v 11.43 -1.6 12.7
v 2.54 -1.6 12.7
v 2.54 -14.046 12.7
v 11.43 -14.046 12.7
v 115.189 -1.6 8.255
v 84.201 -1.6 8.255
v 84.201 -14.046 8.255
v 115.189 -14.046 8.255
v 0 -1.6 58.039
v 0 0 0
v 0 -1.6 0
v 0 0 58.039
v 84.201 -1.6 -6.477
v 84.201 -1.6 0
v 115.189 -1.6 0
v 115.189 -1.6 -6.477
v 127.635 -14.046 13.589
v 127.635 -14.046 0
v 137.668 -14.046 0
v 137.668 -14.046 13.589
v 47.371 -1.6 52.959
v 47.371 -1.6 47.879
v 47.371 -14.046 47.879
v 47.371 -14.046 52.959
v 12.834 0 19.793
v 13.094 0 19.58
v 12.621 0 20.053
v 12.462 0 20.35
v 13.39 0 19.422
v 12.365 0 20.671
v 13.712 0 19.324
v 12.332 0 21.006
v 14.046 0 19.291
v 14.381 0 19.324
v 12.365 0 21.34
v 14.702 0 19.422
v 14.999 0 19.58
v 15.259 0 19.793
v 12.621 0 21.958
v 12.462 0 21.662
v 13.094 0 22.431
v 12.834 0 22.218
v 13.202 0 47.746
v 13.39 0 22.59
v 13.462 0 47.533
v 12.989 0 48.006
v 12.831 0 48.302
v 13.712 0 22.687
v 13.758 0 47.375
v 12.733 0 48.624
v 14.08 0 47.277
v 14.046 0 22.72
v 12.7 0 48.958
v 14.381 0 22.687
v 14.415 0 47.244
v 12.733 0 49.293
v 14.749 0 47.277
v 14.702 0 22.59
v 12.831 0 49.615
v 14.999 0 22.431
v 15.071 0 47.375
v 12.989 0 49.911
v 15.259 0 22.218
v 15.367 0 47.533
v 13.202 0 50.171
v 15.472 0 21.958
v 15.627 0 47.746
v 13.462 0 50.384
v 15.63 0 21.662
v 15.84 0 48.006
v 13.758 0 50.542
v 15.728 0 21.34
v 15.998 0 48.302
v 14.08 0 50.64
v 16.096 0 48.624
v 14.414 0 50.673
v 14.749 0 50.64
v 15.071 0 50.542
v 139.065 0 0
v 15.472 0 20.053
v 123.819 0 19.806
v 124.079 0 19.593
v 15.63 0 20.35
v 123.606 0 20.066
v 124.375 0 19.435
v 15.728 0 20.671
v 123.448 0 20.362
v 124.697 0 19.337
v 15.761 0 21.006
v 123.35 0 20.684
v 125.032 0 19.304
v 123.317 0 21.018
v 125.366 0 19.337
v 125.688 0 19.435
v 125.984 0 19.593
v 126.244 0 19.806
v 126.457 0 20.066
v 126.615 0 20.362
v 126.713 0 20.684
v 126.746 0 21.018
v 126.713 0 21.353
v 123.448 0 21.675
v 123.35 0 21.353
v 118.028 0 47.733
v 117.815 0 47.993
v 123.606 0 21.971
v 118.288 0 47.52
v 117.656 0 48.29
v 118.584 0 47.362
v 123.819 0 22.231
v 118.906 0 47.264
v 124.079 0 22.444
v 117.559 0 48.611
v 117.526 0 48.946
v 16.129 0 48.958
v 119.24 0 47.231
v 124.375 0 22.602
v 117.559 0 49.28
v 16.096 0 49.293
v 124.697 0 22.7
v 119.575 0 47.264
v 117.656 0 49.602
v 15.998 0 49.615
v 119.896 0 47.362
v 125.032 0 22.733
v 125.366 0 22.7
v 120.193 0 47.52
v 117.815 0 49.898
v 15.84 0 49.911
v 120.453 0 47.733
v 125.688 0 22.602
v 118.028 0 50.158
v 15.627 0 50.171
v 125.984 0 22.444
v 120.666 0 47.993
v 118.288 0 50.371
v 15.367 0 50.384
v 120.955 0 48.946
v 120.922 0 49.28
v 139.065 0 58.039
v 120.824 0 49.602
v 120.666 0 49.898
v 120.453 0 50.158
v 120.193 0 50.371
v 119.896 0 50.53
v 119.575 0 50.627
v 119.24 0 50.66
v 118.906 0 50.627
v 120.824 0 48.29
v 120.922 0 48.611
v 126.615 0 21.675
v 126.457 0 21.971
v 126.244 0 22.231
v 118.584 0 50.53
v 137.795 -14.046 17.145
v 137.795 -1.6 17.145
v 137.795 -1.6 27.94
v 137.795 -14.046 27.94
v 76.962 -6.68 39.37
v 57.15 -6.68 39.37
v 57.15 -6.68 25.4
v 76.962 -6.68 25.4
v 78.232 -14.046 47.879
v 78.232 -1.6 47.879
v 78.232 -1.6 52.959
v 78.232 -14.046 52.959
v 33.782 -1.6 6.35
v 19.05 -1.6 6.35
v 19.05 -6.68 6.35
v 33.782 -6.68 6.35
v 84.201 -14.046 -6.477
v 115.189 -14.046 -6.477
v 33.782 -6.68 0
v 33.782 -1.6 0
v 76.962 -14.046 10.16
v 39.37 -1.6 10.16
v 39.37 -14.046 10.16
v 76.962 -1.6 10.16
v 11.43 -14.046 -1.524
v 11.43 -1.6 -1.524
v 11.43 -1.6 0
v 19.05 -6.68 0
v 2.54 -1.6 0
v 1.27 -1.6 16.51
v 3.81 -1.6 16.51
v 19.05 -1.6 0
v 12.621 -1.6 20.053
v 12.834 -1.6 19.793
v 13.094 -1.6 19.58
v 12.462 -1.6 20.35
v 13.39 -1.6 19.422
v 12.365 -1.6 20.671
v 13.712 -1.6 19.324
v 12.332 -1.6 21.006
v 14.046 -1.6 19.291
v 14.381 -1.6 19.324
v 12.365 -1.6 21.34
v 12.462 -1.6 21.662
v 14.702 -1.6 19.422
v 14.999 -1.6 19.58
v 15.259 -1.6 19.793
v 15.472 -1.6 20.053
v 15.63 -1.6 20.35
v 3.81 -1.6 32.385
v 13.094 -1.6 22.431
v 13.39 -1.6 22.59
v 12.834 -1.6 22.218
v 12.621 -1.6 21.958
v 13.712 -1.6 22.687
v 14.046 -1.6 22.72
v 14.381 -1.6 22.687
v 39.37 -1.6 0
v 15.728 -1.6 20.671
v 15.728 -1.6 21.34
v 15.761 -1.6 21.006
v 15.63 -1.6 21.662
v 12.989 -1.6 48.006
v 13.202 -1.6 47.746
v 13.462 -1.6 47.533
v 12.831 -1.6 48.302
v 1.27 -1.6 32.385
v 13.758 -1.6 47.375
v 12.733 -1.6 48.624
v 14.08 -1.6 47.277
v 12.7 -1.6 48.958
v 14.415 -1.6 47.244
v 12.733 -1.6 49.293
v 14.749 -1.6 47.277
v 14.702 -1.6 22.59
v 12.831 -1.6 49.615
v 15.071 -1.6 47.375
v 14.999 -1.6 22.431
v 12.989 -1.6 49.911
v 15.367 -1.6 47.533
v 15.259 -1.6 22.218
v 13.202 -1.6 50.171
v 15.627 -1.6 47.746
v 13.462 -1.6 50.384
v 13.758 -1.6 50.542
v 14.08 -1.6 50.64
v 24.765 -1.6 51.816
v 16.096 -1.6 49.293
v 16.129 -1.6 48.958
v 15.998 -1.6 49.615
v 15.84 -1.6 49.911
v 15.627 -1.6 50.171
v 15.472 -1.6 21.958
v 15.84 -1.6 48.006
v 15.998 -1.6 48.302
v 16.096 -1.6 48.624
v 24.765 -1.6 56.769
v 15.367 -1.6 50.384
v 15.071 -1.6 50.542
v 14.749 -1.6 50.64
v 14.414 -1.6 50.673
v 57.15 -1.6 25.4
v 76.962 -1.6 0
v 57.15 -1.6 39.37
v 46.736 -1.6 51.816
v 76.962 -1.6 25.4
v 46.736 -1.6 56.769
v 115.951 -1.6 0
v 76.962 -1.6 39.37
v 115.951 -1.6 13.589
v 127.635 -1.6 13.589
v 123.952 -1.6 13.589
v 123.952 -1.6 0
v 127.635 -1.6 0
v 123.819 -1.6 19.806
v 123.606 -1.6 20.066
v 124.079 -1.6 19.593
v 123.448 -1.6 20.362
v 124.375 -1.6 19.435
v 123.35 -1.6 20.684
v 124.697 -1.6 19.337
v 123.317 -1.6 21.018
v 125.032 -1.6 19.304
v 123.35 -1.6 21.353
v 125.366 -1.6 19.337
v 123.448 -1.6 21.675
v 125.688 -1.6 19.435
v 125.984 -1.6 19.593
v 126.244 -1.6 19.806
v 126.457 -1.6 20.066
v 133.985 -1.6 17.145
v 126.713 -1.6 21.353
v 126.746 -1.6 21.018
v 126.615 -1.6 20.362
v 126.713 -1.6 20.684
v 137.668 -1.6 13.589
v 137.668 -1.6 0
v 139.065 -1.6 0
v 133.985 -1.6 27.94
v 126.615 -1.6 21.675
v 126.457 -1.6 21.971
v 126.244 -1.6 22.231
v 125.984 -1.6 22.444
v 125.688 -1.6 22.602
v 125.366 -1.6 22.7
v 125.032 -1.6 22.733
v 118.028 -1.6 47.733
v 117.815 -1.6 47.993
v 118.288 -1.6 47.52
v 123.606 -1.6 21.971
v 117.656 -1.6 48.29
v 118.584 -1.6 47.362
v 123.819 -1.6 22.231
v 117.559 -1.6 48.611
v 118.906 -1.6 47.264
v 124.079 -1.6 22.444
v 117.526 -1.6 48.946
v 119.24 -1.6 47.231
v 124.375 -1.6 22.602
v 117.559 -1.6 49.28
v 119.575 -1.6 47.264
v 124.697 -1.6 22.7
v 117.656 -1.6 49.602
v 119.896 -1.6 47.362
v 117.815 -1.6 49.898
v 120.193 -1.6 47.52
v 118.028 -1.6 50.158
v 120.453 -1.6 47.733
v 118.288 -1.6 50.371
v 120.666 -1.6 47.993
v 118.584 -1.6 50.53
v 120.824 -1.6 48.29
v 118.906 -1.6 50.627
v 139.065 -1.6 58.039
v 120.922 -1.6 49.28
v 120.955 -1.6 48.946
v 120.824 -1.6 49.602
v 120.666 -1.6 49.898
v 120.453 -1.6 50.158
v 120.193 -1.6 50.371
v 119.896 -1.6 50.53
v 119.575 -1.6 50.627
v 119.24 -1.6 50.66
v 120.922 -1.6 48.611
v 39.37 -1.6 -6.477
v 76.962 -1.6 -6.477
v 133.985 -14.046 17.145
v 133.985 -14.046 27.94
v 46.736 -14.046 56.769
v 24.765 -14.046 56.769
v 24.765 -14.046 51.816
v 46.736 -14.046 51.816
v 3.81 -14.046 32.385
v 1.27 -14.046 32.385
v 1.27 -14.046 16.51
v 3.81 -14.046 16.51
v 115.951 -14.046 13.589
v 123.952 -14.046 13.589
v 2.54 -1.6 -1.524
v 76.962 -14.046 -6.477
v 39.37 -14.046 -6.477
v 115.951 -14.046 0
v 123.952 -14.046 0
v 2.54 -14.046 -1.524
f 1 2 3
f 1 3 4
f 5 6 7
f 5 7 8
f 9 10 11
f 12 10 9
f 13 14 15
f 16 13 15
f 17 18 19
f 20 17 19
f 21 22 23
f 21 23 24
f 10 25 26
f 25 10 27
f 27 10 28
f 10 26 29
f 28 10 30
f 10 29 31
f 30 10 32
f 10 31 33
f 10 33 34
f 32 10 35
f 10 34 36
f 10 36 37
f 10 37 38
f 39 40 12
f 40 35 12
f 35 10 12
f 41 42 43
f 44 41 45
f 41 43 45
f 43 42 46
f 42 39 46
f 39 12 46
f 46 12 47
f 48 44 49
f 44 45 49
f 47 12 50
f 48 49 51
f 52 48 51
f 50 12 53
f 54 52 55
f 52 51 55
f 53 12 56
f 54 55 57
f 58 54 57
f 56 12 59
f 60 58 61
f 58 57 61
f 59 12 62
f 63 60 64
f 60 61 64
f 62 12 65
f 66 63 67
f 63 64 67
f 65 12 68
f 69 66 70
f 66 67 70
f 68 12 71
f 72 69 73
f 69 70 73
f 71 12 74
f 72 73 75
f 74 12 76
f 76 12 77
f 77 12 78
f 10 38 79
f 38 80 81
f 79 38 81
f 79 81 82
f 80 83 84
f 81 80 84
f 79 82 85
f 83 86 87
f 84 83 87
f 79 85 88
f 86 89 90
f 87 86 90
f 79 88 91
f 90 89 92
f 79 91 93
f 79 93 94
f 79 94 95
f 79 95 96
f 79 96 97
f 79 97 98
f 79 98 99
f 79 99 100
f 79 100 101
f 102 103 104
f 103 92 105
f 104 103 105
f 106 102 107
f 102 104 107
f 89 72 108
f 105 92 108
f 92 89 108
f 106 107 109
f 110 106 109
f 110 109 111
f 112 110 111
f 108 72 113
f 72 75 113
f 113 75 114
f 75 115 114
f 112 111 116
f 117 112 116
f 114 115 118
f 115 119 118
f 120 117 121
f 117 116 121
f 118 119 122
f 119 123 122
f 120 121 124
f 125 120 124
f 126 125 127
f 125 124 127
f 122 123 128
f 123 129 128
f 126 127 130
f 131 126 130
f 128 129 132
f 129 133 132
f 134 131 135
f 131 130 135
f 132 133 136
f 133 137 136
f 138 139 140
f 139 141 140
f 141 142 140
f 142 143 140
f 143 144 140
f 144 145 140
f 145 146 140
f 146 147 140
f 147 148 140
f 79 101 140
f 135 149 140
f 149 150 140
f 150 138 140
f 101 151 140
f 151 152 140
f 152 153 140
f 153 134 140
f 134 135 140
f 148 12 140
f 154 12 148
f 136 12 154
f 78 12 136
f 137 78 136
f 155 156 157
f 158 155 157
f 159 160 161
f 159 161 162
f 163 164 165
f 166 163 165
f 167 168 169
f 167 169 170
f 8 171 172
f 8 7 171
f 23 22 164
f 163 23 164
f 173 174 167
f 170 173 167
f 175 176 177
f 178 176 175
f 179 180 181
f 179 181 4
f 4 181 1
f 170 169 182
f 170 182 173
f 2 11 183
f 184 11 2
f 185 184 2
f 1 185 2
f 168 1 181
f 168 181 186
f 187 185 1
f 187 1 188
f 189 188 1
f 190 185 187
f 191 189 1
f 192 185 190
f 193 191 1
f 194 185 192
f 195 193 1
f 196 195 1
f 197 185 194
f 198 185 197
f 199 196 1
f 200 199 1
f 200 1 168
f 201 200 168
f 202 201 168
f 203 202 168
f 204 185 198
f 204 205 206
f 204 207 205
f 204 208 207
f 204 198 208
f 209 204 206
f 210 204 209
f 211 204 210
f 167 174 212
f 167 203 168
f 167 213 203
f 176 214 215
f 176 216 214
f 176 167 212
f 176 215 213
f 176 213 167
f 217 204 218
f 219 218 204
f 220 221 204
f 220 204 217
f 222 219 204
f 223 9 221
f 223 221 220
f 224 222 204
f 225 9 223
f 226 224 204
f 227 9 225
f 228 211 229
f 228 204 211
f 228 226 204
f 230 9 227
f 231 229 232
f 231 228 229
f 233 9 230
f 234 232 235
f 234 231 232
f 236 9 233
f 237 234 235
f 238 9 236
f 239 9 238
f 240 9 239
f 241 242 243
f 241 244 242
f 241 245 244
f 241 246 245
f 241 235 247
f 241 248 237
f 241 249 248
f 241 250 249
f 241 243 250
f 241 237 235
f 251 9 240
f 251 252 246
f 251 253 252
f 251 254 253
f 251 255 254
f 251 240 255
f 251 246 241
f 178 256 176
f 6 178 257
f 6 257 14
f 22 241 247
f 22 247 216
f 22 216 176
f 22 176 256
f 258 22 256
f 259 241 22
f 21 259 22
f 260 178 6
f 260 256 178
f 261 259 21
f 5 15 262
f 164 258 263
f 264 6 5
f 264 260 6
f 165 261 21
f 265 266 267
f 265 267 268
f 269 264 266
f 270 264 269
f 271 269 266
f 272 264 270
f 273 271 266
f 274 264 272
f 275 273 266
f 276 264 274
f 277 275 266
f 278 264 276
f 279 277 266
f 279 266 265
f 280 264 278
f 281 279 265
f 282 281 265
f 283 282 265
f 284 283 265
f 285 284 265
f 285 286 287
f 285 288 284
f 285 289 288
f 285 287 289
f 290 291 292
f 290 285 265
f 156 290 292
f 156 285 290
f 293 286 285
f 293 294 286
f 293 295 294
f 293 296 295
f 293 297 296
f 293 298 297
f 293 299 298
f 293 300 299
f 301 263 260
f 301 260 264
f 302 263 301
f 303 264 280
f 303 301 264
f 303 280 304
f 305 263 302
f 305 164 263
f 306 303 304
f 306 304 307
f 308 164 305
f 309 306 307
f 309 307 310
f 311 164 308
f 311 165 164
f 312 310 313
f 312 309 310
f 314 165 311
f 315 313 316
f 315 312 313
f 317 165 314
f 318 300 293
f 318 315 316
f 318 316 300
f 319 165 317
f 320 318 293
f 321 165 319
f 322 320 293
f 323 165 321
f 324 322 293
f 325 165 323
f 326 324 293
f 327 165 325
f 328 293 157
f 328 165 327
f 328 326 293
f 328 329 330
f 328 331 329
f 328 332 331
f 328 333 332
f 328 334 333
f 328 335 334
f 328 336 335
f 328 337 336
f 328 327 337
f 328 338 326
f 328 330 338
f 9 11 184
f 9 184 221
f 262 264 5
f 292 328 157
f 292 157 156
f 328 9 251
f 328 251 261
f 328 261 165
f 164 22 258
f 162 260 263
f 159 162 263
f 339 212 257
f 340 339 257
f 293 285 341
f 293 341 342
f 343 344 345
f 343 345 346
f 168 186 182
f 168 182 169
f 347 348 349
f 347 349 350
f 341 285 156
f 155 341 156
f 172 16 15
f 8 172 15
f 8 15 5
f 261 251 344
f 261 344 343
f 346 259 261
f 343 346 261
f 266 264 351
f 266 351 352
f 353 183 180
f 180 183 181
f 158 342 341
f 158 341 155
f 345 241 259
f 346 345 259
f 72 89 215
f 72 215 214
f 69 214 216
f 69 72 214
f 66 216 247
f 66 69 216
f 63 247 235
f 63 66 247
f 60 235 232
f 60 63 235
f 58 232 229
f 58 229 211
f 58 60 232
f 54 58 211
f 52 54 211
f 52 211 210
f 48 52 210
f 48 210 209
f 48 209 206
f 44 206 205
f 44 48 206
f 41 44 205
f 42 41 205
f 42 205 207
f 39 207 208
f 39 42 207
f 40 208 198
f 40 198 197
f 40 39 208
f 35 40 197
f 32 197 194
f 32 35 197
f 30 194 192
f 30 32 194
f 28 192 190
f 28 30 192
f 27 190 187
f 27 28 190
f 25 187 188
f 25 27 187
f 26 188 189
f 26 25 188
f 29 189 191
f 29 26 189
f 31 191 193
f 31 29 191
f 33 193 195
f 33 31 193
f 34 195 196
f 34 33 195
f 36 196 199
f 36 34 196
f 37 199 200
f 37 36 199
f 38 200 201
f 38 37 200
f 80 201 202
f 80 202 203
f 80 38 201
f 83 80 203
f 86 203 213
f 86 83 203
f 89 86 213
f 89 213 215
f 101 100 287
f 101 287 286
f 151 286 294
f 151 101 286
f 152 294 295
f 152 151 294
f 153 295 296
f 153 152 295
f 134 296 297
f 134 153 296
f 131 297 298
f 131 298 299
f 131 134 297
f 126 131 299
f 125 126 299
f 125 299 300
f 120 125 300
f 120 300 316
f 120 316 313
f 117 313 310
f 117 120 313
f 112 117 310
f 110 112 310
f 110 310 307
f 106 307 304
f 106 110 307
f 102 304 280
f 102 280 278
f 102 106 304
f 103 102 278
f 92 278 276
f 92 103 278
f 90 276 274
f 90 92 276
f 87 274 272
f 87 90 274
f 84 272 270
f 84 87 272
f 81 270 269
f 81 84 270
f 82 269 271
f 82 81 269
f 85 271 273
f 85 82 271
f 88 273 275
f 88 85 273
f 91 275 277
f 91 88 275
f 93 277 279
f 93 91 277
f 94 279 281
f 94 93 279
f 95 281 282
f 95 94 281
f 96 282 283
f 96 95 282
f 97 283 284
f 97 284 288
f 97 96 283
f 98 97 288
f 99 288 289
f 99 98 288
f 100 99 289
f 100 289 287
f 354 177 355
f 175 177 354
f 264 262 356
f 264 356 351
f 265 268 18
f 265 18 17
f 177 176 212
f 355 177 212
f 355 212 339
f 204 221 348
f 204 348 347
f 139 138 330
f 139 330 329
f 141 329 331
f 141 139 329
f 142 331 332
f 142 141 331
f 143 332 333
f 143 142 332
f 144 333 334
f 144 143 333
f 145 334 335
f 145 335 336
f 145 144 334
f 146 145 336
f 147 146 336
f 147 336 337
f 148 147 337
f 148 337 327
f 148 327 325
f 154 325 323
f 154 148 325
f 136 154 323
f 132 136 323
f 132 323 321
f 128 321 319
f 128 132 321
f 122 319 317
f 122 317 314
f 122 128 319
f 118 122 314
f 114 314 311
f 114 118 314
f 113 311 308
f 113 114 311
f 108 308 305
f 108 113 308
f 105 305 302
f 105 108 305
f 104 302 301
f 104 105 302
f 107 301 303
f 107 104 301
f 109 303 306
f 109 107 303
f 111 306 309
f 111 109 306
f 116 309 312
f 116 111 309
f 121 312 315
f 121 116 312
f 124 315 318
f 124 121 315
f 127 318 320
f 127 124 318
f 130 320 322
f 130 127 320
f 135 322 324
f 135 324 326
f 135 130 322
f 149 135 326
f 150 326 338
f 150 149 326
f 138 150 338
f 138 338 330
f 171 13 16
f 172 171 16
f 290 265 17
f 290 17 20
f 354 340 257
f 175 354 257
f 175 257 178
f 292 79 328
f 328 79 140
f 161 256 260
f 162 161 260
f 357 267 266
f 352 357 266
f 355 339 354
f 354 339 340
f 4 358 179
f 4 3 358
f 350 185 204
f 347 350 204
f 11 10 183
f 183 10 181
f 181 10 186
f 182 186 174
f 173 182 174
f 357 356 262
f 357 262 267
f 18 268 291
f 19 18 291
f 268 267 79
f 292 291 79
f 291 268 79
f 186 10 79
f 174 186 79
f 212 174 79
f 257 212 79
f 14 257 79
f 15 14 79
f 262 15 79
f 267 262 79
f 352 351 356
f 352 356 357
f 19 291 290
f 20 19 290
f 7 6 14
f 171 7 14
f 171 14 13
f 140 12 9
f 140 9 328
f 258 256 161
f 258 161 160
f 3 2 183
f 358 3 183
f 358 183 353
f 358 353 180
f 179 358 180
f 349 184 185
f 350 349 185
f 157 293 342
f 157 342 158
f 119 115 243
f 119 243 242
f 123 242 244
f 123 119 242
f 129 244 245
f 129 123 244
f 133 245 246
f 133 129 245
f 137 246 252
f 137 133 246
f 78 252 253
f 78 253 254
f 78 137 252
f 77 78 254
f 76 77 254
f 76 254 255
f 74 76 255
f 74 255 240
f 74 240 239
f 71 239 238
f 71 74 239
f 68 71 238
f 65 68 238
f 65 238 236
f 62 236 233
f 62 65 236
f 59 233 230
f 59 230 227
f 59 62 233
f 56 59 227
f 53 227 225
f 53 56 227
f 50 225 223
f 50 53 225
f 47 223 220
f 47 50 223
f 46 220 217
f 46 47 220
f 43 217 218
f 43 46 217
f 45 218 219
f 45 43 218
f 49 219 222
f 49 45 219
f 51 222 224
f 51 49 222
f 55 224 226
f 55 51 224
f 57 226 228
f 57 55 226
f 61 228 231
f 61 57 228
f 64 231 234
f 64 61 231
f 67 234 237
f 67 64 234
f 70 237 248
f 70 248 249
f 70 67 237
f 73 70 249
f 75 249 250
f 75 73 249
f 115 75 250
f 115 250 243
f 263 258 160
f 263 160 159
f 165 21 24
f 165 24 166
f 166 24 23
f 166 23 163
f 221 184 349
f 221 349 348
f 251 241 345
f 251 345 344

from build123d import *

# Parameters (mm, degrees)
F0_W     = 139.065
F0_H     = 58.039
F0_R     = 1.7145
F1_DEPTH = 1.6002
F2_W     = 8.001
F2_H     = 13.589
F2_W_2   = 10.033
F2_W_3   = 30.861
F2_H_2   = 5.08
F2_W_4   = 21.971
F2_H_3   = 4.953
F2_W_5   = 2.54
F2_H_4   = 15.875
F2_W_6   = 37.592
F2_H_5   = 6.477
F2_W_7   = 30.988
F2_W_8   = 3.81
F2_H_6   = 10.795
F2_H_7   = 10.16
F2_H_8   = 8.255
F2_W_9   = 8.89
F2_H_9   = 1.524
F2_H_10  = 12.7
F3_DEPTH = 12.446
F2_W_10  = 19.812
F2_H_11  = 13.97
F2_W_11  = 14.732
F2_H_12  = 6.35
F4_DEPTH = 5.08


with BuildPart() as f1:
    # F0 (on Front) → F1 (new body)
    with BuildSketch(Plane.XZ):
        with Locations((69.5325, 29.0195)):
            Rectangle(F0_W, F0_H)
        with Locations((14.0462, 21.0058)):
            Circle(F0_R, mode=Mode.SUBTRACT)
        with Locations((125.0315, 21.0185)):
            Circle(F0_R, mode=Mode.SUBTRACT)
        with Locations((14.4145, 48.9585)):
            Circle(F0_R, mode=Mode.SUBTRACT)
        with Locations((119.2403, 48.9458)):
            Circle(F0_R, mode=Mode.SUBTRACT)
    extrude(amount=F1_DEPTH)

    # F2 (on face) → F3 (join)
    with BuildSketch(Plane.XZ.offset(1.6002)):
        with Locations((119.9515, 6.7945)):
            Rectangle(F2_W, F2_H)
        with Locations((132.6515, 6.7945)):
            Rectangle(F2_W_2, F2_H)
        with Locations((62.8015, 50.419)):
            Rectangle(F2_W_3, F2_H_2)
        with Locations((35.7505, 54.2925)):
            Rectangle(F2_W_4, F2_H_3)
        with Locations((2.54, 24.4475)):
            Rectangle(F2_W_5, F2_H_4)
        with Locations((58.166, -3.2385)):
            Rectangle(F2_W_6, F2_H_5)
        with Locations((99.695, -3.2385)):
            Rectangle(F2_W_7, F2_H_5)
        with Locations((135.89, 22.5425)):
            Rectangle(F2_W_8, F2_H_6)
        with Locations((58.166, 5.08)):
            Rectangle(F2_W_6, F2_H_7)
        with Locations((99.695, 4.1275)):
            Rectangle(F2_W_7, F2_H_8)
        with Locations((6.985, -0.762)):
            Rectangle(F2_W_9, F2_H_9)
        with Locations((6.985, 6.35)):
            Rectangle(F2_W_9, F2_H_10)
    extrude(amount=F3_DEPTH)

    # F2 (on face) → F4 (join)
    with BuildSketch(Plane.XZ.offset(1.6002)):
        with Locations((67.056, 32.385)):
            Rectangle(F2_W_10, F2_H_11)
        with Locations((26.416, 3.175)):
            Rectangle(F2_W_11, F2_H_12)
    extrude(amount=F4_DEPTH)


solid = f1.part
